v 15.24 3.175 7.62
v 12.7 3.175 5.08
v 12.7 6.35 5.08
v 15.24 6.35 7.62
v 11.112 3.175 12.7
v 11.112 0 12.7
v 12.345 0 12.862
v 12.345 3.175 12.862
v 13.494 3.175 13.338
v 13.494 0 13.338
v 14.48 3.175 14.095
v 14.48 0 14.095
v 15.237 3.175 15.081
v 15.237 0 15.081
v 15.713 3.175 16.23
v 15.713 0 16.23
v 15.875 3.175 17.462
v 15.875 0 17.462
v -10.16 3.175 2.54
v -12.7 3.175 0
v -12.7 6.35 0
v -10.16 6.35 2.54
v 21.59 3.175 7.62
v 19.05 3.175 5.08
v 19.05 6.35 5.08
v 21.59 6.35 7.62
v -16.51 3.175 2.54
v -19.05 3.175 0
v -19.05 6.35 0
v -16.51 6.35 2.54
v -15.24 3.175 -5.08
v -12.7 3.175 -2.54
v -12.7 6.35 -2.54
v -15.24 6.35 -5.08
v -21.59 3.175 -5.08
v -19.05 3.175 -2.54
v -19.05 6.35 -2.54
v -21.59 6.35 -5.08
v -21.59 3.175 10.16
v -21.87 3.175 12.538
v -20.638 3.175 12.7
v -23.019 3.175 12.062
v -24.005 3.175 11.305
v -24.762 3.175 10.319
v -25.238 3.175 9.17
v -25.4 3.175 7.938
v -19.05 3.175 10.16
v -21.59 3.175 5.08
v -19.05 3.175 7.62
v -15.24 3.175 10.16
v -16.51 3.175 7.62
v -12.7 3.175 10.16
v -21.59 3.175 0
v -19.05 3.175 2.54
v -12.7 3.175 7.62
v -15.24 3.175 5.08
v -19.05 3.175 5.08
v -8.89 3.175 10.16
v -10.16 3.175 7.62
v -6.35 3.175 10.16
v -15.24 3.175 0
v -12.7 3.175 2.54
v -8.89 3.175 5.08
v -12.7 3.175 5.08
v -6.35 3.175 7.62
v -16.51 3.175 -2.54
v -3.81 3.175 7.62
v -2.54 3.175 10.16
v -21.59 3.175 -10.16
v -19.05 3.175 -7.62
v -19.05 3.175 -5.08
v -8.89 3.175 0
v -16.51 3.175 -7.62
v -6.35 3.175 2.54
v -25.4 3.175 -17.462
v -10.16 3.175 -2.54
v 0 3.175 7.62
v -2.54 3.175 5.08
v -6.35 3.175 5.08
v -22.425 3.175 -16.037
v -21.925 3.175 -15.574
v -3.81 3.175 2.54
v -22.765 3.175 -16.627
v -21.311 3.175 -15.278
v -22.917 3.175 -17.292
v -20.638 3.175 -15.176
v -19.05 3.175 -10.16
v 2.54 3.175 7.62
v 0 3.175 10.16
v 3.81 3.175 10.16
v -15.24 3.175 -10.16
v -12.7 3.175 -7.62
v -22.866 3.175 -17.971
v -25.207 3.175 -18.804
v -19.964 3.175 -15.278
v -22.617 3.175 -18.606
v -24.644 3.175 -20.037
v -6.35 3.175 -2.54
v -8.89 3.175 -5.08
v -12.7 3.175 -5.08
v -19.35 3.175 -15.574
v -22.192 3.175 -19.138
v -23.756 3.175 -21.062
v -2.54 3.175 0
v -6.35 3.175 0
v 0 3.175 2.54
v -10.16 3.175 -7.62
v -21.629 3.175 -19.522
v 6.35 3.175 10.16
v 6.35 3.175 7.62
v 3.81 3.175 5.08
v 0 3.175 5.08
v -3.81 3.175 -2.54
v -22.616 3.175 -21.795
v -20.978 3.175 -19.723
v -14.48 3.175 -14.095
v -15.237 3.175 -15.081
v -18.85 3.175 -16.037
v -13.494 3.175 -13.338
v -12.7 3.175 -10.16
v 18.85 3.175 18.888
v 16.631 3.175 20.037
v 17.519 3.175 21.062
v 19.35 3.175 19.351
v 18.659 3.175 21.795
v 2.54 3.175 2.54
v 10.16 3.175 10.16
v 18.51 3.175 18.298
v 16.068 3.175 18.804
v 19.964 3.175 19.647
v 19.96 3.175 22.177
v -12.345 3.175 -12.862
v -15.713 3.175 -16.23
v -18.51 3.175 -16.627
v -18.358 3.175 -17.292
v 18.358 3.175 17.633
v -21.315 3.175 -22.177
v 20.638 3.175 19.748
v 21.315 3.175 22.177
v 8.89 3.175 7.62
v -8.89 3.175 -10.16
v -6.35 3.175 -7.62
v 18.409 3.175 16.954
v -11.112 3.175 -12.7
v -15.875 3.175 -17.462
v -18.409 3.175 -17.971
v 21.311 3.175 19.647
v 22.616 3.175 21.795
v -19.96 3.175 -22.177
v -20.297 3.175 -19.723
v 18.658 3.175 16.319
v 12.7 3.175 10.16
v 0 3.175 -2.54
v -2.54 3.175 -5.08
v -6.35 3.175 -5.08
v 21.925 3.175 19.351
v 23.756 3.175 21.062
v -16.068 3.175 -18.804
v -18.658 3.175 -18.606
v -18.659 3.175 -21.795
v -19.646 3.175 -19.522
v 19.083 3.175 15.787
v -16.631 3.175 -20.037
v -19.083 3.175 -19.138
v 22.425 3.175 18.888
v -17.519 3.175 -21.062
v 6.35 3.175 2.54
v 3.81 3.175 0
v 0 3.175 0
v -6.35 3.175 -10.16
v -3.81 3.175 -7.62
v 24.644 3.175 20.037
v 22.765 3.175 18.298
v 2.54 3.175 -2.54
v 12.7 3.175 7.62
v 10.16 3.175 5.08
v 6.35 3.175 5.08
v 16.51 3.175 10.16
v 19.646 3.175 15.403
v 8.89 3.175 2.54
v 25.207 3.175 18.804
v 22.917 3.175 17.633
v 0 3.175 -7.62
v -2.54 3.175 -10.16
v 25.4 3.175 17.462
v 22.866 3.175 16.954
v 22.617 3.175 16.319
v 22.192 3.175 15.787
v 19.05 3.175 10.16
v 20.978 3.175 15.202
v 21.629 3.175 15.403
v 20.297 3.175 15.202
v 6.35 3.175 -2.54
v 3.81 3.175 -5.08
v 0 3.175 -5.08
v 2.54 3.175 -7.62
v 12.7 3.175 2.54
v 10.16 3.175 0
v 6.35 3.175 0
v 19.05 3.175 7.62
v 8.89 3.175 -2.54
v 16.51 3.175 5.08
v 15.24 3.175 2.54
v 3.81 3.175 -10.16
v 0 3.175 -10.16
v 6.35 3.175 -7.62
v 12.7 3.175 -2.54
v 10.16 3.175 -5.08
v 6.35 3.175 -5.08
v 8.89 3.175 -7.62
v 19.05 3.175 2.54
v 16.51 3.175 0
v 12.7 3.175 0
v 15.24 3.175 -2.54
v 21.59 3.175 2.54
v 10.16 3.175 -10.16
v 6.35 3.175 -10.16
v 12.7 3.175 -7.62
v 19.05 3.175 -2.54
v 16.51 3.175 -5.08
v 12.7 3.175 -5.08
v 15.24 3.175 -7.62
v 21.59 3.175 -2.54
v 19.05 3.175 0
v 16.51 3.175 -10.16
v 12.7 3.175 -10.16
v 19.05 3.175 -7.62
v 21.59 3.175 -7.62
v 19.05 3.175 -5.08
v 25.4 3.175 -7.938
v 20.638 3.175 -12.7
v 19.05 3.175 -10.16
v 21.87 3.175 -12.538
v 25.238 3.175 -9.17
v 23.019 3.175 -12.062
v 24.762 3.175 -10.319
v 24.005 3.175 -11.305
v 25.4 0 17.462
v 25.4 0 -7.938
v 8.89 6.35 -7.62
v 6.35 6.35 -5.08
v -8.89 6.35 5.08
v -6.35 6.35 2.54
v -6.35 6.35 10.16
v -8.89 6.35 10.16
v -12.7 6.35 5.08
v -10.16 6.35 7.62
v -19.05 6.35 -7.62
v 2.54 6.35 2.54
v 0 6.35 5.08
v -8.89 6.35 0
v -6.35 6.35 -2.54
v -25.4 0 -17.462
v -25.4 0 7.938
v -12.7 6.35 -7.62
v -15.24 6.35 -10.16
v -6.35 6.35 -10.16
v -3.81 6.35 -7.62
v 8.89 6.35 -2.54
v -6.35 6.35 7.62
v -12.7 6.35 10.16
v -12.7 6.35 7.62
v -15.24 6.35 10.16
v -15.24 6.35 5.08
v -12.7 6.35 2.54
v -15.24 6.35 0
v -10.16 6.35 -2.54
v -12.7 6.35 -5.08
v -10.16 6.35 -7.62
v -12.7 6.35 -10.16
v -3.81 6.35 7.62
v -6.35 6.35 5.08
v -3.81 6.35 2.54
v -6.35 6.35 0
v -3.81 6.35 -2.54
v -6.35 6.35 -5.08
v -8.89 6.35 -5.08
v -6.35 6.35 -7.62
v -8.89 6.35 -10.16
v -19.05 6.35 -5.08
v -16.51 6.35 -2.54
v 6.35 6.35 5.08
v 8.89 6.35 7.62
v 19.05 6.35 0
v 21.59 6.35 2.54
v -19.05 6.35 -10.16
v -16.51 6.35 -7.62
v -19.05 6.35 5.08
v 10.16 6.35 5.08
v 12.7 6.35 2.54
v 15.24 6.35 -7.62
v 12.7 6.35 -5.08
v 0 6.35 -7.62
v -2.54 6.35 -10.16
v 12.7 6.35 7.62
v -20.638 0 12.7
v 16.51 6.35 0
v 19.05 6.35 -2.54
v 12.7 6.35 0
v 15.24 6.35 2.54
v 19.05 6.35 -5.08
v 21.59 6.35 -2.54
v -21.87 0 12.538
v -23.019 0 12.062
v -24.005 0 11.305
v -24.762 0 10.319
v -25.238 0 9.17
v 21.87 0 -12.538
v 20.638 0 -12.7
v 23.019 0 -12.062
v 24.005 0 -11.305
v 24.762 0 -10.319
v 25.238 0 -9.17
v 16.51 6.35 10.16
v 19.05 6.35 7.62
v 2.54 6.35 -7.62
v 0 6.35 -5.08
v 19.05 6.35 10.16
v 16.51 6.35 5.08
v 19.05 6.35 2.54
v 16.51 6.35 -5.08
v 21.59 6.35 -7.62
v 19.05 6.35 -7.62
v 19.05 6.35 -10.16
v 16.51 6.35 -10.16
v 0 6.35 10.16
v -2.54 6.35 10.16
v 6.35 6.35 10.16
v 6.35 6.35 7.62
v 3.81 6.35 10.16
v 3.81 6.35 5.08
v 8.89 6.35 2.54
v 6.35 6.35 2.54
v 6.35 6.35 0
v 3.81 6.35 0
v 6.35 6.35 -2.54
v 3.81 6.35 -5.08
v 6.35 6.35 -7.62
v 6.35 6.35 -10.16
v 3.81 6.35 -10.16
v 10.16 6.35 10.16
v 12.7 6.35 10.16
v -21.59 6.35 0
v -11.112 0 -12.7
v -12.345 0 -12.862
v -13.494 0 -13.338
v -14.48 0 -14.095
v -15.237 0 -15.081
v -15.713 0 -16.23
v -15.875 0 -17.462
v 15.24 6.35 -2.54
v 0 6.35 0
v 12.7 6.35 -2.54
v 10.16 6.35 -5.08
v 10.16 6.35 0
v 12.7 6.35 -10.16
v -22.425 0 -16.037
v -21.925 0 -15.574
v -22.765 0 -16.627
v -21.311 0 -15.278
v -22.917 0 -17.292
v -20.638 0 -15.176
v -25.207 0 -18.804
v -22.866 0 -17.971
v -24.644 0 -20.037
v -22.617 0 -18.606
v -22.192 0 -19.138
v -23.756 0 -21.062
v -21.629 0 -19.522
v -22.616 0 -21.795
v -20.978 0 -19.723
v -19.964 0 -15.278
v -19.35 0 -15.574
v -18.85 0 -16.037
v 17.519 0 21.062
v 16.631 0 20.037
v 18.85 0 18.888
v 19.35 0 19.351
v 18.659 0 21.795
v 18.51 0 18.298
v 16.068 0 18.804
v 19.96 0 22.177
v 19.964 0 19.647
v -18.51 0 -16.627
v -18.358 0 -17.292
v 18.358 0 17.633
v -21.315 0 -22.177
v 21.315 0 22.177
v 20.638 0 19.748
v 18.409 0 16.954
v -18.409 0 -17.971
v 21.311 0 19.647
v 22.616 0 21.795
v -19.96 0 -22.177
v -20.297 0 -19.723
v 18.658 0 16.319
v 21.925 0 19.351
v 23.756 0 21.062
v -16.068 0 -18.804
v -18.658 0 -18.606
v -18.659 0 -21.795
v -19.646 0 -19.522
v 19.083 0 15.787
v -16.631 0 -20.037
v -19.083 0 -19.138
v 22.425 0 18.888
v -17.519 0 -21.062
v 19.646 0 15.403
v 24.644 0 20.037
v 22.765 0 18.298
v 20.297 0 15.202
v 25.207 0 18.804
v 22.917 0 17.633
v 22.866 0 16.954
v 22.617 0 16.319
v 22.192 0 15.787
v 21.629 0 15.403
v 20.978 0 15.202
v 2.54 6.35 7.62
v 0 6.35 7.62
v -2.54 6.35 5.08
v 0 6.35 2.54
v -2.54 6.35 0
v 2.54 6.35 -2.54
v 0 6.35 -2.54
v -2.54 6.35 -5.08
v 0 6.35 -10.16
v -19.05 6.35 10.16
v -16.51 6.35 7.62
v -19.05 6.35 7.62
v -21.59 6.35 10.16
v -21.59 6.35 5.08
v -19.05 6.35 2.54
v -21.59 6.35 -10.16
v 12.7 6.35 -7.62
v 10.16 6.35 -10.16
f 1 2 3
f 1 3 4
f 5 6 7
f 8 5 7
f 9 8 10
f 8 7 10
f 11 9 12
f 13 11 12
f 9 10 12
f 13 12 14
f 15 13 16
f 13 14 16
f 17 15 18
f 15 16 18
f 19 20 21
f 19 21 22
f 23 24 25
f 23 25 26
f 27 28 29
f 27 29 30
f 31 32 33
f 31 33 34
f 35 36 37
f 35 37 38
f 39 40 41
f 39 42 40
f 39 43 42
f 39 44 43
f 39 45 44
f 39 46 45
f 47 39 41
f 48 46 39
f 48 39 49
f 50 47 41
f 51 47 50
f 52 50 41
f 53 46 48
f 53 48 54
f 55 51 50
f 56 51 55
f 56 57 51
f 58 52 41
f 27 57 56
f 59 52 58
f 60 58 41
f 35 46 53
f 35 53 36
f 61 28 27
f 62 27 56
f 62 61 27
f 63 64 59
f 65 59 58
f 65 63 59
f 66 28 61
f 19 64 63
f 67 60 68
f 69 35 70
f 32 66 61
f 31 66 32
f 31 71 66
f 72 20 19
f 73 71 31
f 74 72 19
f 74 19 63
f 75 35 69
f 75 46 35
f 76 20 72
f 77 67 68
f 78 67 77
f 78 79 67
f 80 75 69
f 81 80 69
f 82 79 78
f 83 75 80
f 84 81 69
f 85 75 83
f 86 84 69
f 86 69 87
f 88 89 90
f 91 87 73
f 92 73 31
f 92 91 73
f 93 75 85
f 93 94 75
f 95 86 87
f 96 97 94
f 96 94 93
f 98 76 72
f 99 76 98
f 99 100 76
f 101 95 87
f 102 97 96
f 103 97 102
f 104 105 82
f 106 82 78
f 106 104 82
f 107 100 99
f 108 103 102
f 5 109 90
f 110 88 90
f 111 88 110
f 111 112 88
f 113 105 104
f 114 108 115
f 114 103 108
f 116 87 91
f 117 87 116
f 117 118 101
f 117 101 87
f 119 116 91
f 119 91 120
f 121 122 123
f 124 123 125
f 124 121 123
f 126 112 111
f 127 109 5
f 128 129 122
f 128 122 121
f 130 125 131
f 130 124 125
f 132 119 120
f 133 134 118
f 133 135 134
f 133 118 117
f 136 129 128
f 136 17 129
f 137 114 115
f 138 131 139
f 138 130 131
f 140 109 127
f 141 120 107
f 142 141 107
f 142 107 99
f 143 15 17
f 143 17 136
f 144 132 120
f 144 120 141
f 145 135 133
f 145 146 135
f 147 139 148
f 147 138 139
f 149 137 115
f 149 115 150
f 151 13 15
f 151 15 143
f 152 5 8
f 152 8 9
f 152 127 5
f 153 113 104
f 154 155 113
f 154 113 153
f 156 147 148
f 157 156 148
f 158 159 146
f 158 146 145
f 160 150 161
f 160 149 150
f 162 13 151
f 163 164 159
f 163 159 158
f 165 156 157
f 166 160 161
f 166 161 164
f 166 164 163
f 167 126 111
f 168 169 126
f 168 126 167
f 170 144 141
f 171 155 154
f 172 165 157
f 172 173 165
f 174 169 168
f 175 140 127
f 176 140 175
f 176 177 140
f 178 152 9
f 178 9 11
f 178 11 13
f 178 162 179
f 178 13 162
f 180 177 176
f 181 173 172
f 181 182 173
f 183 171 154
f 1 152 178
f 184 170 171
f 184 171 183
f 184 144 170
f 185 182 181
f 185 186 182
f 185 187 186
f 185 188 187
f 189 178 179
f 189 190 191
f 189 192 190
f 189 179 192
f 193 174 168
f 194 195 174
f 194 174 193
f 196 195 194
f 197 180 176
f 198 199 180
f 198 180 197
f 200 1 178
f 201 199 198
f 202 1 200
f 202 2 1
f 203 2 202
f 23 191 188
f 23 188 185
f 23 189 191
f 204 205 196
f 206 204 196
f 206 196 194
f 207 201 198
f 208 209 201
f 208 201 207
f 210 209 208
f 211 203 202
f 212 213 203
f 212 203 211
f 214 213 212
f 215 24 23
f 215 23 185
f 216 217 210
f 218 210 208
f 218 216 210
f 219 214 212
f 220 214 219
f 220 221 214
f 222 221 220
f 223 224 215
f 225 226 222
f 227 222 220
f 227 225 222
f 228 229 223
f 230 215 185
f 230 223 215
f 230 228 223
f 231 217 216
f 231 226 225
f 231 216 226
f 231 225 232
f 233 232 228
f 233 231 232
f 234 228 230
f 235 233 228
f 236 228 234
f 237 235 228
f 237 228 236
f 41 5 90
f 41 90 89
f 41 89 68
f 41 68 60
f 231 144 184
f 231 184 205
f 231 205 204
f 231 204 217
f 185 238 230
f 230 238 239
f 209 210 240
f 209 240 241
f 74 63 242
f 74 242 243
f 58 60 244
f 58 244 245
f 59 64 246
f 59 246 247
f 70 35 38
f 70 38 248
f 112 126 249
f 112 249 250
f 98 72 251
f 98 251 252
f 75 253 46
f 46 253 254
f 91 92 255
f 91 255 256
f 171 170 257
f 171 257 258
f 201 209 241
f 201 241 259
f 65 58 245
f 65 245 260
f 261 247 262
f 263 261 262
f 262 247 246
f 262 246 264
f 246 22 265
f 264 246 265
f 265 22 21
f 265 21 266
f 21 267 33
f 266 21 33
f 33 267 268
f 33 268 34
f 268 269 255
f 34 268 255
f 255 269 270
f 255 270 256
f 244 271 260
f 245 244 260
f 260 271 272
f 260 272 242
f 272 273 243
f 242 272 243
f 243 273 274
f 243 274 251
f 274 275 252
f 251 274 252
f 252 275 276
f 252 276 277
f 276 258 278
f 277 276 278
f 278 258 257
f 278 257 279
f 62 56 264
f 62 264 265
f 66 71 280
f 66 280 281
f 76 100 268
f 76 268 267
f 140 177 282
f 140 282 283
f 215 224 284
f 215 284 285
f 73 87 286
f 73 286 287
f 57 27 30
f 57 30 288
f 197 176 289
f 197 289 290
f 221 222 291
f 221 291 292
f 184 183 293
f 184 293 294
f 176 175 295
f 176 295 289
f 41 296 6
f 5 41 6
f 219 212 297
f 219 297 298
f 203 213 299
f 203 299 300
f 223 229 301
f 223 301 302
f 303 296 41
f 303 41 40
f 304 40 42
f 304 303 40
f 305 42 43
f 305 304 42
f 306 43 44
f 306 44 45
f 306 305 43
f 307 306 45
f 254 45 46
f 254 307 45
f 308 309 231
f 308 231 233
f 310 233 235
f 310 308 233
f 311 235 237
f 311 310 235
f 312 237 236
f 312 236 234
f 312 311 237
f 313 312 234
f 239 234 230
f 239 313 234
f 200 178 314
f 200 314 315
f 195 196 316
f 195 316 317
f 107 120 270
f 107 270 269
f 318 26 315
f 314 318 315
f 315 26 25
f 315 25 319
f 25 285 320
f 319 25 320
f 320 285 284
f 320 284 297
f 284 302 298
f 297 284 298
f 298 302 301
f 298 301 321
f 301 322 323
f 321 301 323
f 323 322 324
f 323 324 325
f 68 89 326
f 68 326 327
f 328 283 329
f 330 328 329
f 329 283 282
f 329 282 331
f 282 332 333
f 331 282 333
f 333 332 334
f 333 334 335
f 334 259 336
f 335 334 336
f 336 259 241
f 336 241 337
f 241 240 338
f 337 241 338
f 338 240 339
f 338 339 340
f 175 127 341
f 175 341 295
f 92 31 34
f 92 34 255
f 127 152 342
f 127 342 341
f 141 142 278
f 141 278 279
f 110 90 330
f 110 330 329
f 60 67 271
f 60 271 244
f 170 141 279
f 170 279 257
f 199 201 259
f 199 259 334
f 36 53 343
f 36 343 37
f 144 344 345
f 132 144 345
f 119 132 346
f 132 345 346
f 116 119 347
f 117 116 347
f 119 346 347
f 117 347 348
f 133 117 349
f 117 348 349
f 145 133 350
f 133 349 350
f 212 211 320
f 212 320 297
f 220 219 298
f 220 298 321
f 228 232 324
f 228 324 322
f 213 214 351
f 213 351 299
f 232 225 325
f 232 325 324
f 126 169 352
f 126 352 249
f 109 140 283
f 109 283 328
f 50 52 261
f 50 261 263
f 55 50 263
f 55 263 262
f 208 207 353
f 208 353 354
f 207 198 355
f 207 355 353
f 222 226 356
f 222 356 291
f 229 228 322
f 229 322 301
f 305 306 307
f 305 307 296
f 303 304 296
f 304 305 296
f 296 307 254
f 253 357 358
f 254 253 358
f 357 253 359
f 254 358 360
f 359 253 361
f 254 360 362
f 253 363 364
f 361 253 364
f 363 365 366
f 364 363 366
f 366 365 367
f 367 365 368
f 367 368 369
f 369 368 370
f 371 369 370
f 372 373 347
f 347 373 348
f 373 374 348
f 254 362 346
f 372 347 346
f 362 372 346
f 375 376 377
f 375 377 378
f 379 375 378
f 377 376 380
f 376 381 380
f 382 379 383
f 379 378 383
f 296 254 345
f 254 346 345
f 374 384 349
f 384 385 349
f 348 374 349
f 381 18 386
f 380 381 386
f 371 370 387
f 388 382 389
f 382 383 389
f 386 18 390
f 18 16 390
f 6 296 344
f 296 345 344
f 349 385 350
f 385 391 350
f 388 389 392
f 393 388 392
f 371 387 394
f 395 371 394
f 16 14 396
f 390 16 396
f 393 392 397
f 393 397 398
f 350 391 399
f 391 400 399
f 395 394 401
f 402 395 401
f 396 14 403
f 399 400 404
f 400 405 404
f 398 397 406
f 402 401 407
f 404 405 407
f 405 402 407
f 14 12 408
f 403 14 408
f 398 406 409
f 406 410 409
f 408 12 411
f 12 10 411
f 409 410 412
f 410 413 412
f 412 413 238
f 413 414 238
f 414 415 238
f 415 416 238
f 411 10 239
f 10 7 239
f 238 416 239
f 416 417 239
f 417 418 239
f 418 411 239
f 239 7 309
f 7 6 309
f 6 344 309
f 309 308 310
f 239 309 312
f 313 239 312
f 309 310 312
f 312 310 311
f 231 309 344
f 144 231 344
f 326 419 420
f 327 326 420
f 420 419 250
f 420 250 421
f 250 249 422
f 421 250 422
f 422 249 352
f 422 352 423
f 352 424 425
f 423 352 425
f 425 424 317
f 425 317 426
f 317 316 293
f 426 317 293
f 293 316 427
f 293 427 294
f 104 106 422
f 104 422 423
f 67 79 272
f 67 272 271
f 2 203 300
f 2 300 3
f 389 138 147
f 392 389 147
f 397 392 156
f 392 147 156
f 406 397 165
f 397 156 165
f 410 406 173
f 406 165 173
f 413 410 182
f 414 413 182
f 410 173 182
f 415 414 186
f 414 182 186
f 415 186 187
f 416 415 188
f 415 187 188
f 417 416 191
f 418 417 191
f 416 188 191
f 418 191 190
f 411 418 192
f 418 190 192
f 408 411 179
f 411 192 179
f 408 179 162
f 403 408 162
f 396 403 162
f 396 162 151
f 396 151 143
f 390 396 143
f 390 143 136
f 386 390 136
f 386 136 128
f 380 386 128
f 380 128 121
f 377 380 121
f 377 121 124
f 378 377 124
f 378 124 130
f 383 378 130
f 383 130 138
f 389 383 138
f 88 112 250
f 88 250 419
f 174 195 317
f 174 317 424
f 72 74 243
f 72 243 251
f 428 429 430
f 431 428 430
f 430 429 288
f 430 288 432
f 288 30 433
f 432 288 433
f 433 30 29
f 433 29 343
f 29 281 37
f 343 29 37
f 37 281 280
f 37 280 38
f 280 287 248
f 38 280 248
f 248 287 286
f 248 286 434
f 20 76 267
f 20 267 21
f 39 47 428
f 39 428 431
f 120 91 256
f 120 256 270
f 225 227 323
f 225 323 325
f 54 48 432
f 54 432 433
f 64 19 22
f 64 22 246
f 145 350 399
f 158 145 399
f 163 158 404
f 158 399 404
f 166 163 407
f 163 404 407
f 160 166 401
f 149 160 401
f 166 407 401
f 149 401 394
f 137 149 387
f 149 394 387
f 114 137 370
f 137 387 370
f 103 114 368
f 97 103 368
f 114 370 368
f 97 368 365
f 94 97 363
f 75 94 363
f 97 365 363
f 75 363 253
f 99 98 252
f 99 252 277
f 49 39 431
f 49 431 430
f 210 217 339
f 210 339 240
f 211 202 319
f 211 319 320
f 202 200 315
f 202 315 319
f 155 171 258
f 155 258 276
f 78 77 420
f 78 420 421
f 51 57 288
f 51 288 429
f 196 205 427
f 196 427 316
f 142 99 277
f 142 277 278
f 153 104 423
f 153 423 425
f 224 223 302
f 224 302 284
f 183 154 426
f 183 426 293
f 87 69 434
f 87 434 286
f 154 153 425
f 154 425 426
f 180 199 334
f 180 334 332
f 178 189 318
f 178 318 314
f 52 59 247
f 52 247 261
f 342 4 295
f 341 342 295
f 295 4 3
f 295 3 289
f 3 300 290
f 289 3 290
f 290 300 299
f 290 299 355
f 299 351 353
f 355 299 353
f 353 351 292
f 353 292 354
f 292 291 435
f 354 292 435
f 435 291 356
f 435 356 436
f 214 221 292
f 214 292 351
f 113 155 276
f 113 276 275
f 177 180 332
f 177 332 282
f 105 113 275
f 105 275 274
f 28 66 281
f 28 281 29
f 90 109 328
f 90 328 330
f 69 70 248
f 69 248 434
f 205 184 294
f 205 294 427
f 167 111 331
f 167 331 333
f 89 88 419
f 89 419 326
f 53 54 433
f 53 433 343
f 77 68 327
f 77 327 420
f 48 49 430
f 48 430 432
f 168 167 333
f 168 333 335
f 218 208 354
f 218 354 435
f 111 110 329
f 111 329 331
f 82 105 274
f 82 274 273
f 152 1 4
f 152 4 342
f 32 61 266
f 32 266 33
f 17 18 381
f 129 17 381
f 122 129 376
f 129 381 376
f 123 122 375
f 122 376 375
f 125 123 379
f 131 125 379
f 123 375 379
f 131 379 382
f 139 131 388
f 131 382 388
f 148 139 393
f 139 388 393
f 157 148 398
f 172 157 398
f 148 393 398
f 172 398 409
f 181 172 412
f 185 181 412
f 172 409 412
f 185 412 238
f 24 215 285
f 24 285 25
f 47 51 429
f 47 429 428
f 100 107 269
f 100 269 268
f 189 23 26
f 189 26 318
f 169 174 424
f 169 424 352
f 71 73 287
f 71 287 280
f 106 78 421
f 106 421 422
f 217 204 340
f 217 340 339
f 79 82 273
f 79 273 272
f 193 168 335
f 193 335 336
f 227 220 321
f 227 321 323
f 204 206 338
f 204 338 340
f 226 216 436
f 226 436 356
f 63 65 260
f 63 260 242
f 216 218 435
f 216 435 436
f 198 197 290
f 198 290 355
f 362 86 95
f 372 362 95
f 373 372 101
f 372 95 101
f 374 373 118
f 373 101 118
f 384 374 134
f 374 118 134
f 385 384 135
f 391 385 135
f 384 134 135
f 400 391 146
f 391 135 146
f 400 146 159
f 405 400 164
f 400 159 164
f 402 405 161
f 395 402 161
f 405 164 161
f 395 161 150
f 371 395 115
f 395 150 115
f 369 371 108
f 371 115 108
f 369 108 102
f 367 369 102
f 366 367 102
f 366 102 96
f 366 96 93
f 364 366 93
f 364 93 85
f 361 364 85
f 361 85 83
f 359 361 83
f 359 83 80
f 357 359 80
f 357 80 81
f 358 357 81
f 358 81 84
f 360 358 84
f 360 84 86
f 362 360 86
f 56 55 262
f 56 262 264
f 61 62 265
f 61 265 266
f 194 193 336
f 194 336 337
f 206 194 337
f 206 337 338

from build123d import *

# Parameters (mm, degrees)
BOSS_EXTRUDE1_DEPTH = 3.175
SKETCH2_R           = 2.286
CUT_EXTRUDE1_DEPTH  = 34.89972345
FILLET1_START       = -1
FILLET1_DEPTH       = 5
FILLET1_2_DEPTH     = 3.175
BOSS_EXTRUDE2_DEPTH = 3.175
LPATTERN1_COUNT     = 4
LPATTERN1_PITCH     = 6.35
LPATTERN1_COL_COUNT = 4
LPATTERN1_COL_PITCH = 6.35


with BuildPart() as part:
    # Sketch1 → Boss-Extrude1 (new body)
    with BuildSketch(Plane(origin=(0, 0, 0), x_dir=(1, 0, 0), z_dir=(0, 1, 0))):
        with BuildLine():
            Line((-15.875, 12.7), (-15.875, 17.4625))
            ThreePointArc((-15.875, 17.4625), (-20.6375, 22.225), (-25.4, 17.4625))
            Line((-25.4, 17.4625), (-25.4, -12.7))
            Line((-25.4, -12.7), (15.875, -12.7))
            Line((15.875, -12.7), (15.875, -17.4625))
            ThreePointArc((15.875, -17.4625), (20.6375, -22.225), (25.4, -17.4625))
            Line((25.4, -17.4625), (25.4, 12.7))
            Line((25.4, 12.7), (-15.875, 12.7))
        make_face()
    extrude(amount=BOSS_EXTRUDE1_DEPTH)

    # Sketch2 → Cut-Extrude1 (cut, through all)
    with BuildSketch(Plane(origin=(0, 3.175, 0), x_dir=(1, 0, 0), z_dir=(0, 1, 0))):
        with Locations(Location((-20.6375, 17.4625, 0), (0, 0, 270))):
            Circle(SKETCH2_R)
        with Locations(Location((20.6375, -17.4625, 0), (0, 0, 270))):
            Circle(SKETCH2_R)
    extrude(amount=-CUT_EXTRUDE1_DEPTH, mode=Mode.SUBTRACT)

    # Fillet1: read off the stored shape, not the designer's step
    # Fillet1 outline → Fillet1 (cut)
    with BuildSketch(Plane(origin=(0, 0, 0), x_dir=(1, 0, 0), z_dir=(0, 1, 0)).offset(FILLET1_START)):
        with BuildLine():
            Line((25.4, 12.7), (20.6375, 12.7))
            ThreePointArc((20.6375, 12.7), (24.005096045, 11.305096045), (25.4, 7.9375))
            Line((25.4, 7.9375), (25.4, 12.7))
        make_face()
        with BuildLine():
            Line((-25.4, -12.7), (-20.6375, -12.7))
            ThreePointArc((-20.6375, -12.7), (-24.005096045, -11.305096045), (-25.4, -7.9375))
            Line((-25.4, -7.9375), (-25.4, -12.7))
        make_face()
    extrude(amount=FILLET1_DEPTH, mode=Mode.SUBTRACT)

    # Fillet1 2 outline → Fillet1 2 (add)
    with BuildSketch(Plane(origin=(0, 0, 0), x_dir=(1, 0, 0), z_dir=(0, 1, 0))):
        with BuildLine():
            Line((-15.875, 12.7), (-11.1125, 12.7))
            ThreePointArc((-11.1125, 12.7), (-14.480096045, 14.094903955), (-15.875, 17.4625))
            Line((-15.875, 17.4625), (-15.875, 12.7))
        make_face()
        with BuildLine():
            Line((15.875, -12.7), (11.1125, -12.7))
            ThreePointArc((11.1125, -12.7), (14.480096045, -14.094903955), (15.875, -17.4625))
            Line((15.875, -17.4625), (15.875, -12.7))
        make_face()
    extrude(amount=FILLET1_2_DEPTH)

    # Sketch3 → Boss-Extrude2 (add)
    with BuildSketch(Plane(origin=(0, 3.175, 0), x_dir=(1, 0, 0), z_dir=(0, 1, 0))):
        Polygon((0, 10.16), (2.54, 7.62), (0, 5.08), (2.54, 2.54), (0, 0), (2.54, -2.54), (0, -5.08), (2.54, -7.62), (0, -10.16), (-2.54, -10.16), (0, -7.62), (-2.54, -5.08), (0, -2.54), (-2.54, 0), (0, 2.54), (-2.54, 5.08), (0, 7.62), (-2.54, 10.16), align=None)
    boss_extrude2 = extrude(amount=BOSS_EXTRUDE2_DEPTH)

    # LPattern1: Boss-Extrude2 ×4
    with Locations(*[(-i * LPATTERN1_PITCH, 0, 0) for i in range(1, LPATTERN1_COUNT)]):
        add(boss_extrude2)

    # LPattern1 col: Boss-Extrude2 ×4
    with Locations(*[(i * LPATTERN1_COL_PITCH, 0, 0) for i in range(1, LPATTERN1_COL_COUNT)]):
        add(boss_extrude2)


solid = part.part
